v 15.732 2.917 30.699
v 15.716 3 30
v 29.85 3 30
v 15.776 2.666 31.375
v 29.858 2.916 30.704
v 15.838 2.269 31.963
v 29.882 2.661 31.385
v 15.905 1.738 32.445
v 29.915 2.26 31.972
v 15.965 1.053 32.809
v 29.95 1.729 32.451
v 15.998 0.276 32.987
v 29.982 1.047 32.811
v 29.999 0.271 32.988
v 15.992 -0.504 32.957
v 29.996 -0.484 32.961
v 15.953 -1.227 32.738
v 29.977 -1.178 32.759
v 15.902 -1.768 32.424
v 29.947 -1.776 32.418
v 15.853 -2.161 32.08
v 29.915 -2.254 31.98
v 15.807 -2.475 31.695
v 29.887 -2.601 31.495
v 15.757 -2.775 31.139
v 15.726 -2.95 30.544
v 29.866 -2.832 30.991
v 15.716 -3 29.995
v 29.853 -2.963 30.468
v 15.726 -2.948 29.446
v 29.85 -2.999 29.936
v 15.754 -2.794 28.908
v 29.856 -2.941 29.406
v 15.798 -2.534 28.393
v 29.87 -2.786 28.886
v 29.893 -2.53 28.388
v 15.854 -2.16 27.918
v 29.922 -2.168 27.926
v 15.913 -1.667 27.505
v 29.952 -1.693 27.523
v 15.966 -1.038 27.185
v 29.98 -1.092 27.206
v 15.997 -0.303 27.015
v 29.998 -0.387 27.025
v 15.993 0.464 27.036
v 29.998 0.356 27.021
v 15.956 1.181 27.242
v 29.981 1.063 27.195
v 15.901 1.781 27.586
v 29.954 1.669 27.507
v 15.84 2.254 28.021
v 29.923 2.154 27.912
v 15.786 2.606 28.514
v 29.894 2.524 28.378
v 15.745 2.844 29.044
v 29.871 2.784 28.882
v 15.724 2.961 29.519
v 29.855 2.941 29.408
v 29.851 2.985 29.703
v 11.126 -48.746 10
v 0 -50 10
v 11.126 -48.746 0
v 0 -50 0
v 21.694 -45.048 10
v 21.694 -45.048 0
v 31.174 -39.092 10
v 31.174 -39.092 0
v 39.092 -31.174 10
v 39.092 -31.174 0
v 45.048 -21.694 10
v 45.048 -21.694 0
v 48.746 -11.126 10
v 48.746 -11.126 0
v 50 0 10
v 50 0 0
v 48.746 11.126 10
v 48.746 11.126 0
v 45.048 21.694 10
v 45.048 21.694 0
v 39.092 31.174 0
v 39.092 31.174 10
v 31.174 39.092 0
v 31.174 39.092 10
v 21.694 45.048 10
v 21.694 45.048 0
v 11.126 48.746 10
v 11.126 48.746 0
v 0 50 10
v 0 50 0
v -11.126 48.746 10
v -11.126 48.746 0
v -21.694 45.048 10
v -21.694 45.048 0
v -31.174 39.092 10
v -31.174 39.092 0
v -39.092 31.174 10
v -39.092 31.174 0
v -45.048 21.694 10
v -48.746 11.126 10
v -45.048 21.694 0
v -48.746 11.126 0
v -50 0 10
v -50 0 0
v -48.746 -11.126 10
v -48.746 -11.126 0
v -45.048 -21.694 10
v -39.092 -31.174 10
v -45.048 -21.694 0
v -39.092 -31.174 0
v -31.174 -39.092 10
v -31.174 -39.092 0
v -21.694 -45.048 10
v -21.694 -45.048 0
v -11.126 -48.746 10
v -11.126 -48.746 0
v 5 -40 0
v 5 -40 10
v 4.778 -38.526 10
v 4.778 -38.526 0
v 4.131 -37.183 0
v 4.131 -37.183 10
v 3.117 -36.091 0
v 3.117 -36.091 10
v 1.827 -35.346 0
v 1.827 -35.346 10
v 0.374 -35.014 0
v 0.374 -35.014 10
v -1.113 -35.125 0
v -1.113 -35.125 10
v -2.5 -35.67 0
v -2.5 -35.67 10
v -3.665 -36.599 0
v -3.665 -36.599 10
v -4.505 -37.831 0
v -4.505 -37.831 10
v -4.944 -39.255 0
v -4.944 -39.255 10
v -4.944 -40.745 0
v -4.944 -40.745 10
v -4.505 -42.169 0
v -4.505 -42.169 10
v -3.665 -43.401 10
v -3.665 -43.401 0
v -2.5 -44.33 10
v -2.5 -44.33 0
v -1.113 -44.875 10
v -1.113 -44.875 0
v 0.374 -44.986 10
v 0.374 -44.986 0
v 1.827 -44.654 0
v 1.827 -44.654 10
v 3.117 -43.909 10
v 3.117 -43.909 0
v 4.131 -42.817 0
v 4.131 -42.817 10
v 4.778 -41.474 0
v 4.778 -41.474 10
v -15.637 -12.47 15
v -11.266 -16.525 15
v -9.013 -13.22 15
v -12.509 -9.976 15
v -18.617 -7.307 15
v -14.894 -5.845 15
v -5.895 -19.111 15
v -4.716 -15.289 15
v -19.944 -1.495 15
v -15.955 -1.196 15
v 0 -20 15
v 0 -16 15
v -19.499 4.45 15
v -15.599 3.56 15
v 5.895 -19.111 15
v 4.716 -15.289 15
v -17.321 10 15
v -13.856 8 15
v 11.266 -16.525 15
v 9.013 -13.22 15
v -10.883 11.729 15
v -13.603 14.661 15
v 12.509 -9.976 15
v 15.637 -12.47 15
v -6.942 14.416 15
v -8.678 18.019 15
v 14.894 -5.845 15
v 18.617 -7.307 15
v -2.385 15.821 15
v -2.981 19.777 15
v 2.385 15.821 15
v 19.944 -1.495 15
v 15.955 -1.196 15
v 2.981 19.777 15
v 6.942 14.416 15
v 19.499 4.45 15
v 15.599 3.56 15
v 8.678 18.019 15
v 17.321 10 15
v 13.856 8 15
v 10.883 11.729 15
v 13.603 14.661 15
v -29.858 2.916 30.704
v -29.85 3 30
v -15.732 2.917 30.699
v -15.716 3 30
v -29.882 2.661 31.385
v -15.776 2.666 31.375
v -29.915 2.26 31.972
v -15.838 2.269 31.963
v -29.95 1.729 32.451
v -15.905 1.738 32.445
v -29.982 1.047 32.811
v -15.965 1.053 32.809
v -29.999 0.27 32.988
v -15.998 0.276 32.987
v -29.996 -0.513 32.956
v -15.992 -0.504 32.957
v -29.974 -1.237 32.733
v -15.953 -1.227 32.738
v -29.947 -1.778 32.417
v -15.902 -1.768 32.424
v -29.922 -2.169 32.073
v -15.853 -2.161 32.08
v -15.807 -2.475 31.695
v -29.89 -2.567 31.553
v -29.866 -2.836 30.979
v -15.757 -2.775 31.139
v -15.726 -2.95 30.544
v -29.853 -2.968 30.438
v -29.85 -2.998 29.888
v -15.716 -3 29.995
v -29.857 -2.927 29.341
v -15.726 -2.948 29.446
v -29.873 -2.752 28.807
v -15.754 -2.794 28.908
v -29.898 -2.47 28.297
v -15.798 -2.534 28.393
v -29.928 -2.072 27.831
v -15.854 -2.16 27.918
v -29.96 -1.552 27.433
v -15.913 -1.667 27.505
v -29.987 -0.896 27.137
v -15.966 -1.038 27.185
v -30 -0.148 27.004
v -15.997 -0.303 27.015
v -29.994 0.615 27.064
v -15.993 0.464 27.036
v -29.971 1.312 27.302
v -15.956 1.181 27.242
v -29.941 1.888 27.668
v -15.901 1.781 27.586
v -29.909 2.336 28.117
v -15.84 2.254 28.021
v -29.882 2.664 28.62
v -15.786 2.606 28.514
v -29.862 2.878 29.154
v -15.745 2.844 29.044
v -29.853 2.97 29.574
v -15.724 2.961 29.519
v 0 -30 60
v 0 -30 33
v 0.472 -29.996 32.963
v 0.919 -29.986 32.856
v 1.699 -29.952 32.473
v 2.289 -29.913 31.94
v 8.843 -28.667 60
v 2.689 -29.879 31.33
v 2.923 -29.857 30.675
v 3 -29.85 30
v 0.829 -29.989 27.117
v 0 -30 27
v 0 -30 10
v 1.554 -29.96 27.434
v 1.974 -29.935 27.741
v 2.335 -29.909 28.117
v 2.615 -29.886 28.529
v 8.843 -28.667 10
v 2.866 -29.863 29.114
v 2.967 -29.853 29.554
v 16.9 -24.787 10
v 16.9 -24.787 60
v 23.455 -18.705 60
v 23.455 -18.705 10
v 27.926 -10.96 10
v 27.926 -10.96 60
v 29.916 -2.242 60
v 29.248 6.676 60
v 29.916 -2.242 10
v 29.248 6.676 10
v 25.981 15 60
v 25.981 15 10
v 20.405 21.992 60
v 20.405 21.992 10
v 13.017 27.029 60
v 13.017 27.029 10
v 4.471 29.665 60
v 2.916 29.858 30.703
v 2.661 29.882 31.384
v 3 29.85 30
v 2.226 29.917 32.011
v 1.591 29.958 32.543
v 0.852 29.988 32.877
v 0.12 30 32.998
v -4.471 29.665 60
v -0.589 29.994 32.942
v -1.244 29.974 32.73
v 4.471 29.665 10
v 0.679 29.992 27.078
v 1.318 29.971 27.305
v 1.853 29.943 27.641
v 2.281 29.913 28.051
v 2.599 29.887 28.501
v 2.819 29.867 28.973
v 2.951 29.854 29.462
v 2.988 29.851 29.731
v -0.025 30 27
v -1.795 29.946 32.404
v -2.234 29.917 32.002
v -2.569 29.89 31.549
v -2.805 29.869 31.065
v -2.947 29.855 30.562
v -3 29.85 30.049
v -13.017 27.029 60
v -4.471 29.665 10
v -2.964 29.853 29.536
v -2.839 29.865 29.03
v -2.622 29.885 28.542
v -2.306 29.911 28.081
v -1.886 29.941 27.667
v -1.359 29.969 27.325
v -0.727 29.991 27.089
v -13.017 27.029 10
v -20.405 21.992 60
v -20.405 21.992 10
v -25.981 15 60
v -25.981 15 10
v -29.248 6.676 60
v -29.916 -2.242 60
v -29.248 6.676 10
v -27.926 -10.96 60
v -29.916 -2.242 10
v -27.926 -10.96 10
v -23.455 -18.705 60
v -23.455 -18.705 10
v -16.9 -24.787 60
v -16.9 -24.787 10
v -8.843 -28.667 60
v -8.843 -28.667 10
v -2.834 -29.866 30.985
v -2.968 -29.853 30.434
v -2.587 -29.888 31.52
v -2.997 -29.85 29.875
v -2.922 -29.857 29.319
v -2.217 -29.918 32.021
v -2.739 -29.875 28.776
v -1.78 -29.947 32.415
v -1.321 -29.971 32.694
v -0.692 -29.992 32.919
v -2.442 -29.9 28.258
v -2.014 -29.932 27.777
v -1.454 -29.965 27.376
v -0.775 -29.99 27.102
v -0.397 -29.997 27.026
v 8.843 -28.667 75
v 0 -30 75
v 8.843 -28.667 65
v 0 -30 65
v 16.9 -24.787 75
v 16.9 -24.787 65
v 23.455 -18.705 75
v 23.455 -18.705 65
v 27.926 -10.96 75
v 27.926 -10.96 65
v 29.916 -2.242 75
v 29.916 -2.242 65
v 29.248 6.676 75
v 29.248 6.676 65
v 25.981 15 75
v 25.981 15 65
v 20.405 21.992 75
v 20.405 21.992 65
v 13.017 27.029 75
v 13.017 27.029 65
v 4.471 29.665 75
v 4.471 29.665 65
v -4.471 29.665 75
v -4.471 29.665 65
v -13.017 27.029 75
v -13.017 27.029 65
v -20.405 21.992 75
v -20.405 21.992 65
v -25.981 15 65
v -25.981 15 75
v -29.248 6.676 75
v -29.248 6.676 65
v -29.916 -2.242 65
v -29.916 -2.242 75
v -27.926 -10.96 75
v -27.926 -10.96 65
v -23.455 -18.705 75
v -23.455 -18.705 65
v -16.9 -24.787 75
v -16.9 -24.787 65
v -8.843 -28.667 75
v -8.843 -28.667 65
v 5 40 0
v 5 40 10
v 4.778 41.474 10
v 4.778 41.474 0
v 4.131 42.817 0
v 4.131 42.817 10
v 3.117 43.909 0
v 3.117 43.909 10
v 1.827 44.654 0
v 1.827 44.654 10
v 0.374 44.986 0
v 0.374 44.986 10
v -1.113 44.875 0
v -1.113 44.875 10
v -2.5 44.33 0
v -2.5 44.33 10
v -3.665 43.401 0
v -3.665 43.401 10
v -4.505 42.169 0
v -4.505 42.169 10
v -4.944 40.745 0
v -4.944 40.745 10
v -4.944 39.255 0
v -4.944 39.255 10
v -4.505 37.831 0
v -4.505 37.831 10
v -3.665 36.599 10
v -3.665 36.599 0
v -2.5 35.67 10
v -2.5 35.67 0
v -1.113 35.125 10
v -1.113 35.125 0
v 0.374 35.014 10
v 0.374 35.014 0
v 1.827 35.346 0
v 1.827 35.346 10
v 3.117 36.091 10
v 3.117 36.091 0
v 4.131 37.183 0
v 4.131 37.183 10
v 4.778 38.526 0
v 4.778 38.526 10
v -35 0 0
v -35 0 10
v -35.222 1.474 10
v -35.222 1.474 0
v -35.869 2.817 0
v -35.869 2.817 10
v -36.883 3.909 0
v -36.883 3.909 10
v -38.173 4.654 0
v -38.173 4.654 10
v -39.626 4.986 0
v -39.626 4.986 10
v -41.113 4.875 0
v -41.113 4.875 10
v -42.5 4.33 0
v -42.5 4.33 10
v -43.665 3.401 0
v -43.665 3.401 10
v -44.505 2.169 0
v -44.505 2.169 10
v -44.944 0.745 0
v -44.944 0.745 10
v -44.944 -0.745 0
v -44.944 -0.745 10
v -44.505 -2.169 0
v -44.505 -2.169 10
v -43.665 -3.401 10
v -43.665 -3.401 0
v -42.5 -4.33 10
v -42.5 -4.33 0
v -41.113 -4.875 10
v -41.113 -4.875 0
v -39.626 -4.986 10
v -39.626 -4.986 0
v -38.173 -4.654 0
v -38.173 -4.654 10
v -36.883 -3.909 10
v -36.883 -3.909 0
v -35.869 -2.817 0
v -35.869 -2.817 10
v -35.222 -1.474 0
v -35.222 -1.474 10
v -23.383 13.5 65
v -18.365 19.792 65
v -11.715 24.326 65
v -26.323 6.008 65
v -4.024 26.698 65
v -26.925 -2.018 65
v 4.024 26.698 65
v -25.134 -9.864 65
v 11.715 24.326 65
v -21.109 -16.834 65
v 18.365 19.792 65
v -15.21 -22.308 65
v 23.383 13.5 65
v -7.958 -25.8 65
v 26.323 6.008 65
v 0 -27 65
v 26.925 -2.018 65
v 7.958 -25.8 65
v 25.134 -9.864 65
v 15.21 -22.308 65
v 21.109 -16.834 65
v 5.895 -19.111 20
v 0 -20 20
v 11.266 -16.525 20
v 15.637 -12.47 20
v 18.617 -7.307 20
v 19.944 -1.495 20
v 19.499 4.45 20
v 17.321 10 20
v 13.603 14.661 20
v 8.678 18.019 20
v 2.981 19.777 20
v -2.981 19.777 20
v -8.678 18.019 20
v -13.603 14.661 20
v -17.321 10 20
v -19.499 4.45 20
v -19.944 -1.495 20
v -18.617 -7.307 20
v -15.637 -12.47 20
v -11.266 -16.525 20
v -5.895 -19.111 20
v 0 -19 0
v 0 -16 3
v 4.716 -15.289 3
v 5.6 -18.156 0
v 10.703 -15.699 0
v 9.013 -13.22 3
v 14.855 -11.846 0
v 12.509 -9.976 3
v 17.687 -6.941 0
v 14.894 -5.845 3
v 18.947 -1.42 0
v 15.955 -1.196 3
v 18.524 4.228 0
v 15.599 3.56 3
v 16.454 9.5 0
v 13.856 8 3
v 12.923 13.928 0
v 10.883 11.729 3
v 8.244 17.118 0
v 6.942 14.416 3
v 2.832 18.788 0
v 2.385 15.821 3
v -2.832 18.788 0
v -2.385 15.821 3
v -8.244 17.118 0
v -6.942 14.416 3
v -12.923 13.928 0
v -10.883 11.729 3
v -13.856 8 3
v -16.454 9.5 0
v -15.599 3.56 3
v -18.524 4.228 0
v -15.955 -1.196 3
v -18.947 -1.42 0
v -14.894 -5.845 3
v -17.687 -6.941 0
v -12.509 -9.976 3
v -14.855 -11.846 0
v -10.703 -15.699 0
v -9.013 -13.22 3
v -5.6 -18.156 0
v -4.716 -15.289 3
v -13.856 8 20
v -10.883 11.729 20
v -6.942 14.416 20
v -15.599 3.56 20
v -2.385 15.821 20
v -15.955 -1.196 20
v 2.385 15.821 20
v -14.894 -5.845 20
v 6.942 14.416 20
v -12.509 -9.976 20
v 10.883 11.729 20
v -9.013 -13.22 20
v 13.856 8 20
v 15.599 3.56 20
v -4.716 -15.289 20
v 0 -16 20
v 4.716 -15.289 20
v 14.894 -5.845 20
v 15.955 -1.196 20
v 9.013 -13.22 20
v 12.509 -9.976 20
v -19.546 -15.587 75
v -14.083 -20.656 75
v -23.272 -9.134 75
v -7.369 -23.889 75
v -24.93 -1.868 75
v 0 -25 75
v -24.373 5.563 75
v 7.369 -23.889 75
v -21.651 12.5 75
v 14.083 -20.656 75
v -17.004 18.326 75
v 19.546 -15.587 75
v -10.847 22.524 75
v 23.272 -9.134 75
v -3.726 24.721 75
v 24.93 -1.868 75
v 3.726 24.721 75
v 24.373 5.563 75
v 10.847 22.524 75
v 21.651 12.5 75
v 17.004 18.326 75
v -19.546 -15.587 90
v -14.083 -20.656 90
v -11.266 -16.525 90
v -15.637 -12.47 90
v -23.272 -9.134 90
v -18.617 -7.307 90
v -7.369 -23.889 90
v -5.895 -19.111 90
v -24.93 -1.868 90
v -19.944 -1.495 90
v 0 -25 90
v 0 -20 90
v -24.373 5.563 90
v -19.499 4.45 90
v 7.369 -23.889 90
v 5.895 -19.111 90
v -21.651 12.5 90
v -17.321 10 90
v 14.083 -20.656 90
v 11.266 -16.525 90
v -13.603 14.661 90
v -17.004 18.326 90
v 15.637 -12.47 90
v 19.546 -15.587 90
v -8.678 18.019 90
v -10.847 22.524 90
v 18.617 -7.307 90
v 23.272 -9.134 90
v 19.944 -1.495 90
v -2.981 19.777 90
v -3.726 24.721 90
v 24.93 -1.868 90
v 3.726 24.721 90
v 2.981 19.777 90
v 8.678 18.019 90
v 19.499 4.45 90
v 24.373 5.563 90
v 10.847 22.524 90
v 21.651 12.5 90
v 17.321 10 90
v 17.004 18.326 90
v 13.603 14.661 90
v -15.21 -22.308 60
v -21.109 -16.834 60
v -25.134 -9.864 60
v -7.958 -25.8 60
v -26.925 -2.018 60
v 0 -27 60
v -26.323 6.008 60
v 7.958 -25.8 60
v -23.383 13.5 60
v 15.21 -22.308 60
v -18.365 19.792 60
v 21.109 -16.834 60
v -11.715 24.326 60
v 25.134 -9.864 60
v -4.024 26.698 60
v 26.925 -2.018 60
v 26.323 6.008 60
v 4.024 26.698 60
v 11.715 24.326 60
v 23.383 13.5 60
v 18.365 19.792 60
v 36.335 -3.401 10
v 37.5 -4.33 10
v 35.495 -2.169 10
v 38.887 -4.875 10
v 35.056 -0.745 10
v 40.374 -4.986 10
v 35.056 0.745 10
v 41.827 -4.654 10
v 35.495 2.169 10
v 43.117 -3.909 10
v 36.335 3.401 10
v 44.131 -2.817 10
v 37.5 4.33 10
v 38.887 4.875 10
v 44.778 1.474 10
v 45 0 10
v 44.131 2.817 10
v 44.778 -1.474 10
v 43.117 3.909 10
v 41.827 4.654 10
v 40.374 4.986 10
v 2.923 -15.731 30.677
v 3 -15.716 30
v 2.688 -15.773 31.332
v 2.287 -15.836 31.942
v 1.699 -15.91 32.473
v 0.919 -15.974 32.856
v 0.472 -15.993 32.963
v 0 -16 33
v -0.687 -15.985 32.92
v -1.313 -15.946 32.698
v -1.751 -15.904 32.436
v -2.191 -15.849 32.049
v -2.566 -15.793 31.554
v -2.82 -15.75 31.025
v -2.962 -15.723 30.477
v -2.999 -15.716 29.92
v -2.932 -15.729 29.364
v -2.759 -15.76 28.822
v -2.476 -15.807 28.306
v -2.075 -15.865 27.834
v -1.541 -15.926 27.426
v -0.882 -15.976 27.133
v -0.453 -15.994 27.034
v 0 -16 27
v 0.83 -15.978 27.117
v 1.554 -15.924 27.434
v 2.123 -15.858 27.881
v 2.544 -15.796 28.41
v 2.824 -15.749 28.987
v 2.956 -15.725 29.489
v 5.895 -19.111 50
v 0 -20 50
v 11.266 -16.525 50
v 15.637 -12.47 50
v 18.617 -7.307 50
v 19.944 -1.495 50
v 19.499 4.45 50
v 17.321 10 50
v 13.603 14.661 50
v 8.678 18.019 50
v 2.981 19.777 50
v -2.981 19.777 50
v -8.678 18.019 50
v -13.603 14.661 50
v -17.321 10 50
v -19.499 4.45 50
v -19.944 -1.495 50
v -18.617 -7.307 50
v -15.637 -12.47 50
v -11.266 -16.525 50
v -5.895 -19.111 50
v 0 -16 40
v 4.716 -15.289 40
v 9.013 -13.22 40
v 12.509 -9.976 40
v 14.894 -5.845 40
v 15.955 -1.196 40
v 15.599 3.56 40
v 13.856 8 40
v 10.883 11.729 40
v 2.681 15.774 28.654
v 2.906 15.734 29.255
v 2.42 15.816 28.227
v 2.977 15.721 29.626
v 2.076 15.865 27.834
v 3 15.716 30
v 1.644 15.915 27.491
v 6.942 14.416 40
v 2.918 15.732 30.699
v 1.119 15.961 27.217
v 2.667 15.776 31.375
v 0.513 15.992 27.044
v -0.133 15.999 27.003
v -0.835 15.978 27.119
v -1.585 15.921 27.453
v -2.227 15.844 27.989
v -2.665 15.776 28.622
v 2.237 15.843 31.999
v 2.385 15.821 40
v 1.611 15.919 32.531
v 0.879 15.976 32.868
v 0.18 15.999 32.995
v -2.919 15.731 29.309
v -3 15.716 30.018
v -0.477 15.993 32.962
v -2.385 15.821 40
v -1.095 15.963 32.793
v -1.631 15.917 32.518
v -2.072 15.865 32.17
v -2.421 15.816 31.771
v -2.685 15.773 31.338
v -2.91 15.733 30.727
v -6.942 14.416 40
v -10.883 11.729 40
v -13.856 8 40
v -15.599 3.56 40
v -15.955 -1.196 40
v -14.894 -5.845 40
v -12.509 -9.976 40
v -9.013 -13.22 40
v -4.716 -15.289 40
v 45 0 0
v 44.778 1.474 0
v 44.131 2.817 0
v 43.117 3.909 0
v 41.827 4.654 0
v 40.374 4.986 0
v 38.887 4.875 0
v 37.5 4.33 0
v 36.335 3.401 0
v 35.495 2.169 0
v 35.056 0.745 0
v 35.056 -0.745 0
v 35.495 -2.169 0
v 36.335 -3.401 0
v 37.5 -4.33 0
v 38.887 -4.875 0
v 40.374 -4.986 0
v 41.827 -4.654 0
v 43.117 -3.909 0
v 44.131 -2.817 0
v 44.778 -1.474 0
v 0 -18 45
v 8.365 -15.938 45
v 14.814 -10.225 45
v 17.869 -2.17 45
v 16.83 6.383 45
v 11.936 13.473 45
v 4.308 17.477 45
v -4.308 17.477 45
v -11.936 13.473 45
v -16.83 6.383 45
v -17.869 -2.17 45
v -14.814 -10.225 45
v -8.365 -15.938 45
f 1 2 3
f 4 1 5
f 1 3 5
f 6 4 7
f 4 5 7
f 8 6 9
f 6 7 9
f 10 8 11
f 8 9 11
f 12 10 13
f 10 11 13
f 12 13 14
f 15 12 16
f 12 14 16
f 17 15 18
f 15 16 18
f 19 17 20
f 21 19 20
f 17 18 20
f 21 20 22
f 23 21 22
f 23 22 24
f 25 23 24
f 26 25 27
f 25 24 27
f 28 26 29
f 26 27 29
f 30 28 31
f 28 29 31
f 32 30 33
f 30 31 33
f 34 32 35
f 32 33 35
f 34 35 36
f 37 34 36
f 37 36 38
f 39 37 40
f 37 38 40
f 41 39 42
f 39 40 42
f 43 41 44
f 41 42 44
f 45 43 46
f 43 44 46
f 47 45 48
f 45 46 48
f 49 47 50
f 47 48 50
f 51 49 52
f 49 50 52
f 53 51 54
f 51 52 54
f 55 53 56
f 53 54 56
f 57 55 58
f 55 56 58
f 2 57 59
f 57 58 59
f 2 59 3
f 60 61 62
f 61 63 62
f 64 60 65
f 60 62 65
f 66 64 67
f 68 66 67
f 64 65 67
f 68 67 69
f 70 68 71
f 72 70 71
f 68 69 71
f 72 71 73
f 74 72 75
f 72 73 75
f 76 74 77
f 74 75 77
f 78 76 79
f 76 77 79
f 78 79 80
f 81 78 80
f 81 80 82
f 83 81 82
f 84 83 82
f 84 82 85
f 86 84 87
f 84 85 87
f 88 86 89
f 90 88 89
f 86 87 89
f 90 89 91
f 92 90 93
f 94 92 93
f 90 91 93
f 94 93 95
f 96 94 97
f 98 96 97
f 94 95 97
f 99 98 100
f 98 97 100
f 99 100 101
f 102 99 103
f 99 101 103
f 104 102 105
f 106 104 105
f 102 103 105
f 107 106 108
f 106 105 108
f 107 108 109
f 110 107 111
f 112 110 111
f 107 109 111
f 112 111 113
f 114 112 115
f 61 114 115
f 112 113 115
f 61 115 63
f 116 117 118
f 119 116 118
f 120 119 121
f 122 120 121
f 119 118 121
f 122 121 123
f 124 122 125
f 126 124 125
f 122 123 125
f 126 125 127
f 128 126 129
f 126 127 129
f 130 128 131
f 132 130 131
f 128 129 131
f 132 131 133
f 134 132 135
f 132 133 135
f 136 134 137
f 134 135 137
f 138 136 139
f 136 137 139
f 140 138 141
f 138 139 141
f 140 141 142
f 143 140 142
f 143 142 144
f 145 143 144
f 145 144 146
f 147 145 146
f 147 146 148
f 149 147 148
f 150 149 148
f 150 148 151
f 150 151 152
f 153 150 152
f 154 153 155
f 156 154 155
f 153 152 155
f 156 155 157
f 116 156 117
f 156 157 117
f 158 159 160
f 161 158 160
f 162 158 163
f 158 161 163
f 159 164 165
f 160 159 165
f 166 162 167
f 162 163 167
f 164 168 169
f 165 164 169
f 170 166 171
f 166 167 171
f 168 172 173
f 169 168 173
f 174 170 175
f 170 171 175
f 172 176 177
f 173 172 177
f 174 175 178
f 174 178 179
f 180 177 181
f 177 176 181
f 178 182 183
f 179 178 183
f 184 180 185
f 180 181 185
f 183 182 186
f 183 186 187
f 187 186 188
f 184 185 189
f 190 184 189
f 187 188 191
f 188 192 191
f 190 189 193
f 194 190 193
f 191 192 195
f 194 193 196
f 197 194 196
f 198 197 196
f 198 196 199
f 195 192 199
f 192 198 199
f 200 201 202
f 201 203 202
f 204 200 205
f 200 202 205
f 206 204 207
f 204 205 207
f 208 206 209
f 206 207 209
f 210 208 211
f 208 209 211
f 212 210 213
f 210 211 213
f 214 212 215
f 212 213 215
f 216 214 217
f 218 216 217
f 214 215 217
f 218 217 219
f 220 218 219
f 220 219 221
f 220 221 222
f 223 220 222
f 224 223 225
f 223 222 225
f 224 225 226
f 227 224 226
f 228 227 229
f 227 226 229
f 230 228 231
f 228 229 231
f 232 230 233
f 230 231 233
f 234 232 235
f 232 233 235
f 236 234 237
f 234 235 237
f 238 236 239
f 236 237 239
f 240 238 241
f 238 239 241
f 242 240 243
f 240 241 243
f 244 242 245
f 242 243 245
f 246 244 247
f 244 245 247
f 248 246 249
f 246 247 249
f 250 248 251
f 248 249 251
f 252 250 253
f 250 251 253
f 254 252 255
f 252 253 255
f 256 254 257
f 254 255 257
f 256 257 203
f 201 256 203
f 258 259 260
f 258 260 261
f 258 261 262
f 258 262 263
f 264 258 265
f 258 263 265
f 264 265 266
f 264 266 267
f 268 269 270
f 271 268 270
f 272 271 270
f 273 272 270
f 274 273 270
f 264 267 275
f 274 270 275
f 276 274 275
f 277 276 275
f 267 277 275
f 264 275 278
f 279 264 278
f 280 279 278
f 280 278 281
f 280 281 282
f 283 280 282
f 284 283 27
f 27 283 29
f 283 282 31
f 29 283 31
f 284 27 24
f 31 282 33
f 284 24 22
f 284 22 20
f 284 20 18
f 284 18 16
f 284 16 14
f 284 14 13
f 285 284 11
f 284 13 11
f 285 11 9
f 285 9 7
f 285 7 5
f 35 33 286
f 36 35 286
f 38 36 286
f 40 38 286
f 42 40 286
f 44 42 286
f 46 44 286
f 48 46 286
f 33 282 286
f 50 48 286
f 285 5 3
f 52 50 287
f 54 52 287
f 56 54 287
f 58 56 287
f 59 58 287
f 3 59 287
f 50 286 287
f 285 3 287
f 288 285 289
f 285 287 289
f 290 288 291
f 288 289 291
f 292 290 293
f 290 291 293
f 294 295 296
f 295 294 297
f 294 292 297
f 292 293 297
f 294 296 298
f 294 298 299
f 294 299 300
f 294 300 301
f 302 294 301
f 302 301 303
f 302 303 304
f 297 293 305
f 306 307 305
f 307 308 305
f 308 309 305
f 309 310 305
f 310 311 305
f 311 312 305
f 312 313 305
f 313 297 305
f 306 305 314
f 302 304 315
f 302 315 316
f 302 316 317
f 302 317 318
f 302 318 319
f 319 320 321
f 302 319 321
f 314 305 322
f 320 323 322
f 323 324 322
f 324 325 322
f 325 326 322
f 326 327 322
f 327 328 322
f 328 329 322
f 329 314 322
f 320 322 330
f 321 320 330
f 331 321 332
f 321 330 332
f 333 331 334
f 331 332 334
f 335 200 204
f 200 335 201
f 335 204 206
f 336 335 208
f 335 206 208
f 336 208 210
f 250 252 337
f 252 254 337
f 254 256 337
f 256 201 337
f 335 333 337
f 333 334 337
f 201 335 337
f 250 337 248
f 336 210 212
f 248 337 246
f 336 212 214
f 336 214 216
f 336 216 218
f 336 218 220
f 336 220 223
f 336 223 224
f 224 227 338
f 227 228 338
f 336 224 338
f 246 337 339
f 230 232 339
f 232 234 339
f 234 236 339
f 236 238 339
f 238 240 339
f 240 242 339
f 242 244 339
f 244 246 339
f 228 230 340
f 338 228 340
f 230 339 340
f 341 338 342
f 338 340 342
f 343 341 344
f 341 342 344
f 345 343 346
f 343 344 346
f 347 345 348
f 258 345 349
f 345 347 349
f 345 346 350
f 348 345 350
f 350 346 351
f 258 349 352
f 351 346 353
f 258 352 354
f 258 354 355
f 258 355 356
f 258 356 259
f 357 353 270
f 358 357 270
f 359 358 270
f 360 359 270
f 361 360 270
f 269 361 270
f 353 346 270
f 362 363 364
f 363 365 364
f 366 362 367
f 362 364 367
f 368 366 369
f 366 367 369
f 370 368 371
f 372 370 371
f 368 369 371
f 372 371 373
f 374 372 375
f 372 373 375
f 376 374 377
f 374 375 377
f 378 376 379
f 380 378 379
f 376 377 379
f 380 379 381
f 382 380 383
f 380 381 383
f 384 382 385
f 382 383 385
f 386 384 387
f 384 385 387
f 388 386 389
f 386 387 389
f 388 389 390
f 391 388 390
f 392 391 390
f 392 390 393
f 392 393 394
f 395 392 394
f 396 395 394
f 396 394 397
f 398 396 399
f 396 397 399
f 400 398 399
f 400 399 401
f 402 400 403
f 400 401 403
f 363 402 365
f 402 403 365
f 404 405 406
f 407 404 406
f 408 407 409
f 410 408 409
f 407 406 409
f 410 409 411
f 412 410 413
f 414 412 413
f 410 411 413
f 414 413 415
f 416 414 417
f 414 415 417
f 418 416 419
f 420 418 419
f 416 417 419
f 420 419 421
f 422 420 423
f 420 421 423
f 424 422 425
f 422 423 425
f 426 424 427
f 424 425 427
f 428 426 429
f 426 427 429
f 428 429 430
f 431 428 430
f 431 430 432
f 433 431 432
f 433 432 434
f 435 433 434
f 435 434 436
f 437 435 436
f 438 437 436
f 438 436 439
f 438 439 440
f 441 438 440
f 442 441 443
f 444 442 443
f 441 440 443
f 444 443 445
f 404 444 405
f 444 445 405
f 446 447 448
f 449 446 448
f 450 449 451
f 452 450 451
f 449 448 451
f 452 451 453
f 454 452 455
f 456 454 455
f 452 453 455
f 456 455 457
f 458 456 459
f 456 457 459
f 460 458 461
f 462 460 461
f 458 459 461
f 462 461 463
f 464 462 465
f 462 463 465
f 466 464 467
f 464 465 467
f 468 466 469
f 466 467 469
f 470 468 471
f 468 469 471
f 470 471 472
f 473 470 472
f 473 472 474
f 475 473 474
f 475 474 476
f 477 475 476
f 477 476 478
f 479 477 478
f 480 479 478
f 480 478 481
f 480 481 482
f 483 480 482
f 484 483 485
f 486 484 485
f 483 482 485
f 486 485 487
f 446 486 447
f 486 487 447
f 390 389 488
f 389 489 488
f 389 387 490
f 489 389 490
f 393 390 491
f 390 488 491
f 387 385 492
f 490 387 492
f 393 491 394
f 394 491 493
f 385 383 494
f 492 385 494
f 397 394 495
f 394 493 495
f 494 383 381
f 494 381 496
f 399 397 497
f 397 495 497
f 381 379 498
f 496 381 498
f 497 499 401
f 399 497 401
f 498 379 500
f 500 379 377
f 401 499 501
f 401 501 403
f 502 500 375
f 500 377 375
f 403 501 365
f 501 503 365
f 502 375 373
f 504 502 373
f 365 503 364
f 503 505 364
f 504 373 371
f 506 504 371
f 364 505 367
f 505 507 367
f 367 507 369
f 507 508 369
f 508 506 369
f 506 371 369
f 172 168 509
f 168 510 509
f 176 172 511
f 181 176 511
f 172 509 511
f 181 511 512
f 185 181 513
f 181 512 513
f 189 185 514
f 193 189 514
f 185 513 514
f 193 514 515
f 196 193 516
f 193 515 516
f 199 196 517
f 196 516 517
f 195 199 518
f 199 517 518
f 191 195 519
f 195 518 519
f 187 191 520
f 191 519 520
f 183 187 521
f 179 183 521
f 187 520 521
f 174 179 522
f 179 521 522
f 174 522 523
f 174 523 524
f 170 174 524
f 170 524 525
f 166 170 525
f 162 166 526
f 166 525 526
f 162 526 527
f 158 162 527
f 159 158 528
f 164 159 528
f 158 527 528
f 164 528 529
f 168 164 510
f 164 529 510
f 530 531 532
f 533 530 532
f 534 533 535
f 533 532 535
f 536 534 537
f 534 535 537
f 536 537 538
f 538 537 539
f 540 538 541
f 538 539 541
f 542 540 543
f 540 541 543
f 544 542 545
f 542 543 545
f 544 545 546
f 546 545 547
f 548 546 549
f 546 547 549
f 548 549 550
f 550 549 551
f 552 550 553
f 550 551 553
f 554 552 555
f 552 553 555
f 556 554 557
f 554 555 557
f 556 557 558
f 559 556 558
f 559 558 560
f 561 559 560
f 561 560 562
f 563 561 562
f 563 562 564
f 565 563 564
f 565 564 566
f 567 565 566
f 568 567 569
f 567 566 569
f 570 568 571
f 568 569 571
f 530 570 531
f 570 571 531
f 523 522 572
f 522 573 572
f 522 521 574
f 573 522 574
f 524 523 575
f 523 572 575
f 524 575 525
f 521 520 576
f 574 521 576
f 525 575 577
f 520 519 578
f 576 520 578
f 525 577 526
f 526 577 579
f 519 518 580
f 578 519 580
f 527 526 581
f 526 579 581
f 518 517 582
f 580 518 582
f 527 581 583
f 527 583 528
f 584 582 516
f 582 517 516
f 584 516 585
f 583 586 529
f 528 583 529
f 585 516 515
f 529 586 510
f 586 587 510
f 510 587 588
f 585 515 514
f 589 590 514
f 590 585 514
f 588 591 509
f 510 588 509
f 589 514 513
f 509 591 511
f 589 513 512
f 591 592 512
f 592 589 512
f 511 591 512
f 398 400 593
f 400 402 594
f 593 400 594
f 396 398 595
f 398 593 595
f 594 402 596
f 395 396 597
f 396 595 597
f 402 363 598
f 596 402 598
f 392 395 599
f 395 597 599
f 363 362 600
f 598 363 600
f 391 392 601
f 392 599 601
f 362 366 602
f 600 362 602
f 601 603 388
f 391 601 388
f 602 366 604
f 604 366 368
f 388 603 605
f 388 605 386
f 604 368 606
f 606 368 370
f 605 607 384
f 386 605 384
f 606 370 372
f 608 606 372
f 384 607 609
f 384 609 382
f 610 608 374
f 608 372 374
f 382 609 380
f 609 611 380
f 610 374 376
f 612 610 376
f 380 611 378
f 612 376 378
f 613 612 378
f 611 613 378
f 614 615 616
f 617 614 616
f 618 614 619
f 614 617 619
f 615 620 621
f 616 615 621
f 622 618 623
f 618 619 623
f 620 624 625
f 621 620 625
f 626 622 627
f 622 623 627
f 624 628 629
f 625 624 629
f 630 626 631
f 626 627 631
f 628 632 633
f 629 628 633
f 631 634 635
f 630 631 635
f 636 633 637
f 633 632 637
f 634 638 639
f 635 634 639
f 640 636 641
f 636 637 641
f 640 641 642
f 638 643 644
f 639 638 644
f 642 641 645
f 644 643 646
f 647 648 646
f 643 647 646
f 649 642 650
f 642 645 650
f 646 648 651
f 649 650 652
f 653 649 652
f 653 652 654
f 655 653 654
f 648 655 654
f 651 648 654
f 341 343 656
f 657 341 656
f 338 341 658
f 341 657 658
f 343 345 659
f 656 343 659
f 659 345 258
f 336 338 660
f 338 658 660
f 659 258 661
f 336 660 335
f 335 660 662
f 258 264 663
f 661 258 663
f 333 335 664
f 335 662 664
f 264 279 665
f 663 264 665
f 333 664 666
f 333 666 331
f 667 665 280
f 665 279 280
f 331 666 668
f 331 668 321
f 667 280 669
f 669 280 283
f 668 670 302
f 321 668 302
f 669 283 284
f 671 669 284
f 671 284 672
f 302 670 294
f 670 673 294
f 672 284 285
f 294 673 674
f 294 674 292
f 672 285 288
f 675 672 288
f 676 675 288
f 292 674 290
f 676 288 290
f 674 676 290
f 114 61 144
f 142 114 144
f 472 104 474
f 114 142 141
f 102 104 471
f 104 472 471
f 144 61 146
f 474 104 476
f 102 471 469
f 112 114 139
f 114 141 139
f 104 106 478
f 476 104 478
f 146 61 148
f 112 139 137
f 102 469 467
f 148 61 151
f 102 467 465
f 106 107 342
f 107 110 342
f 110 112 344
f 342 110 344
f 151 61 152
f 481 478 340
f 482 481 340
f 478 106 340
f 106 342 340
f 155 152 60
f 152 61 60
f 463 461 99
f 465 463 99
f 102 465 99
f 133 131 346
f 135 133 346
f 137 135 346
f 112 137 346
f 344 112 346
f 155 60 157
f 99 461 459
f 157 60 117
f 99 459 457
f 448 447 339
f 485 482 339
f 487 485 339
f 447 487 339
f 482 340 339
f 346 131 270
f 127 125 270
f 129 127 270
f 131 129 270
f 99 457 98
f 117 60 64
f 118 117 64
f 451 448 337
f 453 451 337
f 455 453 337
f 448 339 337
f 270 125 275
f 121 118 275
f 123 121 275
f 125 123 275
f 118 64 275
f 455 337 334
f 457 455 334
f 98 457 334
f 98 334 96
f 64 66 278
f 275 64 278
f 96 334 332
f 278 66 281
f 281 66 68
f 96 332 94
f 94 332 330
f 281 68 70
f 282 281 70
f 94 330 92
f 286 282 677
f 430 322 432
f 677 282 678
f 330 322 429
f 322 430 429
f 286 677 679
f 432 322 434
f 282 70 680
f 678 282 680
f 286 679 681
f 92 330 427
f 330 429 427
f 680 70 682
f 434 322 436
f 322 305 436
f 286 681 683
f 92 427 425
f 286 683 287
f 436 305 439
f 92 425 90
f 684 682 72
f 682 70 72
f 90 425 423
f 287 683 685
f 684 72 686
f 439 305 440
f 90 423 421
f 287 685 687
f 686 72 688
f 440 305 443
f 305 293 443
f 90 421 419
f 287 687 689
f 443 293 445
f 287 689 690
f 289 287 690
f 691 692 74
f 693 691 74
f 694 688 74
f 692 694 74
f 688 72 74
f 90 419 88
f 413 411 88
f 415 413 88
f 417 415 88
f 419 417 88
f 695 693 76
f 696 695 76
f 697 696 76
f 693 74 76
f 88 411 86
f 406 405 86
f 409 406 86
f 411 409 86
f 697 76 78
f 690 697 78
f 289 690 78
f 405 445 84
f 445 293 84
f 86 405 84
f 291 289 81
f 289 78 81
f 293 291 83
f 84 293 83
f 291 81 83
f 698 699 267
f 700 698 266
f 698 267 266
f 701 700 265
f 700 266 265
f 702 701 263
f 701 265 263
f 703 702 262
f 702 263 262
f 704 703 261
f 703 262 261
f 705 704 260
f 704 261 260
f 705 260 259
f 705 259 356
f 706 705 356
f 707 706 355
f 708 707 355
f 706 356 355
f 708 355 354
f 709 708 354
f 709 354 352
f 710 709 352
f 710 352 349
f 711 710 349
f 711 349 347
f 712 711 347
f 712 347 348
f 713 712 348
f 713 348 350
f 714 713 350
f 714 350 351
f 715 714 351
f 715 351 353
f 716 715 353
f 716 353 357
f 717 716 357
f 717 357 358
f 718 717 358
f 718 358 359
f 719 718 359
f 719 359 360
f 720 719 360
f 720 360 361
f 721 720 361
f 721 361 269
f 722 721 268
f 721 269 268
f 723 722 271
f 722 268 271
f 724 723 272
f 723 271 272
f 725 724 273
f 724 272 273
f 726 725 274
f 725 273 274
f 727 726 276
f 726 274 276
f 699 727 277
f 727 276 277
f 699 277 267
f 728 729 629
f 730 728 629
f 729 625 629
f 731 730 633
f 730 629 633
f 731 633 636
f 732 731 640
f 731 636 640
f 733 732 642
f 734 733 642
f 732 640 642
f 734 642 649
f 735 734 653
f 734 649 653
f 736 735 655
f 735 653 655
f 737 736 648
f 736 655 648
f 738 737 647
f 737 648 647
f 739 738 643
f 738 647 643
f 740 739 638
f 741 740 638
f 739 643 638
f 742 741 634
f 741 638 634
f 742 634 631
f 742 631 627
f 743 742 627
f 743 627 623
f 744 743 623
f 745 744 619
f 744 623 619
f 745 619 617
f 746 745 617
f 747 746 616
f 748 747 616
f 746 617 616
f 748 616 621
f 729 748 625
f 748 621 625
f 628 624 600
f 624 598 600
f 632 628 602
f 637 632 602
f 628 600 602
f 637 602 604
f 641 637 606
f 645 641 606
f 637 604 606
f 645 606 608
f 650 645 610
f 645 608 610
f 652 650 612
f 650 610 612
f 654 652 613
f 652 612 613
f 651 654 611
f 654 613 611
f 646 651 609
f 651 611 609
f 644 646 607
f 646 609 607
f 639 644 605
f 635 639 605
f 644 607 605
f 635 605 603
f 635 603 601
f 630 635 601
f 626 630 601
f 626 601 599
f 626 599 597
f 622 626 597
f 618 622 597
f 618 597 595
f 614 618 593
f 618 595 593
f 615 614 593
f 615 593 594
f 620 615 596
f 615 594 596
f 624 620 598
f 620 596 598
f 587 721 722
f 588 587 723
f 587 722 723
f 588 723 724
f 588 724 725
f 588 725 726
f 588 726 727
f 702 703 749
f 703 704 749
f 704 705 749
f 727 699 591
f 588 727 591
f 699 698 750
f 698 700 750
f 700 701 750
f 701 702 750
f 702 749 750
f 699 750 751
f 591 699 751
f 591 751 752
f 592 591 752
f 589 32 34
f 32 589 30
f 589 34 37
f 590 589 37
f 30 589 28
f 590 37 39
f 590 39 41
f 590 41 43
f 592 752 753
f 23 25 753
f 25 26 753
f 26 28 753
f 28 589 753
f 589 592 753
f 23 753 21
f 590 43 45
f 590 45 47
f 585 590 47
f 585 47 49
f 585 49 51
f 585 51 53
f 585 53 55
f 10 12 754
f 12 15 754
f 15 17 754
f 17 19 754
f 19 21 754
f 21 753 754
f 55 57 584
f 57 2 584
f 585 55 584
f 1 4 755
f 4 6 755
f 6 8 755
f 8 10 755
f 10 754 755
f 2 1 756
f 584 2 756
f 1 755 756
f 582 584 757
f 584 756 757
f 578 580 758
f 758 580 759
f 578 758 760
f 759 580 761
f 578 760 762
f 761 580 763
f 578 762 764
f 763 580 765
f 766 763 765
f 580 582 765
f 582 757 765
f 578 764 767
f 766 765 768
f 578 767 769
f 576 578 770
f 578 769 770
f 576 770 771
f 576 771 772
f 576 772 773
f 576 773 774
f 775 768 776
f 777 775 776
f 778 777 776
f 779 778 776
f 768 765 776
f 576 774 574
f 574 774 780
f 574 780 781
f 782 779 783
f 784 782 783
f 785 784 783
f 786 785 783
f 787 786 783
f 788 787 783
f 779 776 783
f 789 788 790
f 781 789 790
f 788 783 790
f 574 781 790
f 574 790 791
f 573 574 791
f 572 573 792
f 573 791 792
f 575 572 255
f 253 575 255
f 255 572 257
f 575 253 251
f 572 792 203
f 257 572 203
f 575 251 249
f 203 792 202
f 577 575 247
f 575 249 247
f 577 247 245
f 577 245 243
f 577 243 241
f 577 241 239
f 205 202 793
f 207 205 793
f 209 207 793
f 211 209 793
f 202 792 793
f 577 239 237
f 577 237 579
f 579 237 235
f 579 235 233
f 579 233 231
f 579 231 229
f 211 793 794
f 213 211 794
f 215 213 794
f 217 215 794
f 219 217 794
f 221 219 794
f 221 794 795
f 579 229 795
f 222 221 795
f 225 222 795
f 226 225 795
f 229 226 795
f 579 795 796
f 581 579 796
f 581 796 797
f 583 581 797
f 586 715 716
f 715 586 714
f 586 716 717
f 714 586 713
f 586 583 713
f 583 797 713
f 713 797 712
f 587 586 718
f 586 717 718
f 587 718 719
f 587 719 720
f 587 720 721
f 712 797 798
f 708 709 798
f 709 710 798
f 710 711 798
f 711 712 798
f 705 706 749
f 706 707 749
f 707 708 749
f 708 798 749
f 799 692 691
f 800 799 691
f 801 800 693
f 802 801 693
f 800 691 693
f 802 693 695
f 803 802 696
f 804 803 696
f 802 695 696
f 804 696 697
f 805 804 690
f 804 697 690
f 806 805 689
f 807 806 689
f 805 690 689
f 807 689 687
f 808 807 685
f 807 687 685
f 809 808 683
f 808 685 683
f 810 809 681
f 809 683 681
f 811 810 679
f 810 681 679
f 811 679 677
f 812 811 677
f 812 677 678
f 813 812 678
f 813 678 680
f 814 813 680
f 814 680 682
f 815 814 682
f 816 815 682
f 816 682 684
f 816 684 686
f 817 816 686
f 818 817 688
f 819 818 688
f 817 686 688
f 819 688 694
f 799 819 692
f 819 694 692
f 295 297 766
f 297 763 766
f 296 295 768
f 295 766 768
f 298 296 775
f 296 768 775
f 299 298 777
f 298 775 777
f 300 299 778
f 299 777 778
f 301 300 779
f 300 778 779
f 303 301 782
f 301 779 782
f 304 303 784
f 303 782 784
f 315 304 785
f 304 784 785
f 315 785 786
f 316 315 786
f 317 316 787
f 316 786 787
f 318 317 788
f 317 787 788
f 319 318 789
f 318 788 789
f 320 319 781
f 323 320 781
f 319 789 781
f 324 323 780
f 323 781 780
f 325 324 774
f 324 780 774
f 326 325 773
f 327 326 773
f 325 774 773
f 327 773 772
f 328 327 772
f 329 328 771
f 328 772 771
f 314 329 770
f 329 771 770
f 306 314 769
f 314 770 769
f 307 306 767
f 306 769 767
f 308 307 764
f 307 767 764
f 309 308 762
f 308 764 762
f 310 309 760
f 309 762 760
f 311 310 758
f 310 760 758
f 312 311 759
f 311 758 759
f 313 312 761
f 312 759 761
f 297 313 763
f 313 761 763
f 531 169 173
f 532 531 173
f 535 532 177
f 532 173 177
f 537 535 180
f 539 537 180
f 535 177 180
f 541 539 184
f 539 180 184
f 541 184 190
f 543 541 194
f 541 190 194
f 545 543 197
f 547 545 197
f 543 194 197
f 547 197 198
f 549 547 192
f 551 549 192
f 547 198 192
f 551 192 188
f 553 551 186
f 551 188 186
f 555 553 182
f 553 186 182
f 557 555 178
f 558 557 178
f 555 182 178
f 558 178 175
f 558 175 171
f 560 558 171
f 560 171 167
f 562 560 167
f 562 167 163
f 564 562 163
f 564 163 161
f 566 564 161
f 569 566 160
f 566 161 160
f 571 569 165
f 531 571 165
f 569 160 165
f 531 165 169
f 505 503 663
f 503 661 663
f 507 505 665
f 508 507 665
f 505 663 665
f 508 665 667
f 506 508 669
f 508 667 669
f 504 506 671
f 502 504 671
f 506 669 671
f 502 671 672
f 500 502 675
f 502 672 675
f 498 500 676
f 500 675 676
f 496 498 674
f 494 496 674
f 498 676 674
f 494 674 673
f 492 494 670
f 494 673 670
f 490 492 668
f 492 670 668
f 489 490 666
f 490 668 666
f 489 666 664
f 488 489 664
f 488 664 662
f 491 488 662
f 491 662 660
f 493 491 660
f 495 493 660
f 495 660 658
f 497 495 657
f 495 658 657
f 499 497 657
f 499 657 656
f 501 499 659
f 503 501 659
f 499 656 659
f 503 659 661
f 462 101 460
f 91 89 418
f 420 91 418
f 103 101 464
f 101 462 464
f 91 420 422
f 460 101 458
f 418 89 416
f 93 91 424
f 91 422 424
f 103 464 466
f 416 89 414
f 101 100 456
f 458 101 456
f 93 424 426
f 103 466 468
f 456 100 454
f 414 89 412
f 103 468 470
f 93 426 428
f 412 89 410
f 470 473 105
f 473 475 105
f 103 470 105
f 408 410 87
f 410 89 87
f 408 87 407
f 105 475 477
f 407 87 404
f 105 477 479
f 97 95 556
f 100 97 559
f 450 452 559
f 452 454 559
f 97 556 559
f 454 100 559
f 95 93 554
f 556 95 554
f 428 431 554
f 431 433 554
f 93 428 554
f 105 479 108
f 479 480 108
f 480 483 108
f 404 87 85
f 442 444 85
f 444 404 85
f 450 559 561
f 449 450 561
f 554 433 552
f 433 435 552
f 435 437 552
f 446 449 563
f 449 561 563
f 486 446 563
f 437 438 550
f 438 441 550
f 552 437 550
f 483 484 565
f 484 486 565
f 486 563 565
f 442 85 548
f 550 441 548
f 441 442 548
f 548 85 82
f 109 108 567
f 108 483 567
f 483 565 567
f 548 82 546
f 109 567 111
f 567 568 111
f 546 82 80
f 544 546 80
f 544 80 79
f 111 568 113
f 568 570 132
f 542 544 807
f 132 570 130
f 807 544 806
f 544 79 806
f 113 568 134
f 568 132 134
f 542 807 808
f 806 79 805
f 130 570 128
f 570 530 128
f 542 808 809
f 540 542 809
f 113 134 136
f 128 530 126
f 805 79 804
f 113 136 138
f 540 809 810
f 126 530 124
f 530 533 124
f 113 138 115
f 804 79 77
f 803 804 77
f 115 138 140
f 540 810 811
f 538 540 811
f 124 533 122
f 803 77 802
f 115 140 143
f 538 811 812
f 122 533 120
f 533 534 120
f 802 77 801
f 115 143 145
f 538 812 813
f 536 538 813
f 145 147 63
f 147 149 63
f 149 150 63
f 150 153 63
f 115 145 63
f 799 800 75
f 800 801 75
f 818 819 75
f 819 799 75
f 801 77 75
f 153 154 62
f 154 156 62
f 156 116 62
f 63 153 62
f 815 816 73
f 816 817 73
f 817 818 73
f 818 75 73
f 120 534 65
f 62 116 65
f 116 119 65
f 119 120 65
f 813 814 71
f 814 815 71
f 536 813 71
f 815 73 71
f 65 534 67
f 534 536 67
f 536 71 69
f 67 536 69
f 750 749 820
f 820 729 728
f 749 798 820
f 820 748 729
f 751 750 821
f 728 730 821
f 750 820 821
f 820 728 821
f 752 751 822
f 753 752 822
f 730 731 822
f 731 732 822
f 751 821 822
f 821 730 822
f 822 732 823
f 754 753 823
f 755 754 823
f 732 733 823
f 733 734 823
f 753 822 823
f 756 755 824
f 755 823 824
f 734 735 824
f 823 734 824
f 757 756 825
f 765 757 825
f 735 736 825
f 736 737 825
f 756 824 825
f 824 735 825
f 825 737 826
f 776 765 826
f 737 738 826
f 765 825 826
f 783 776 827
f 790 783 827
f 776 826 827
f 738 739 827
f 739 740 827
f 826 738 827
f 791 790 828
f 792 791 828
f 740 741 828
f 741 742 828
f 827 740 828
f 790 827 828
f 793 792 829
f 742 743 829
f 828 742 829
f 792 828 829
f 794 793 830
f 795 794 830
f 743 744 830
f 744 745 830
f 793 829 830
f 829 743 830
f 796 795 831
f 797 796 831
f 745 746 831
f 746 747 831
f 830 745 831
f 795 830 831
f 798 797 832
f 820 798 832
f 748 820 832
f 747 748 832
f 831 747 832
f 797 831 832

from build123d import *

# Parameters (mm, degrees)
F2_SIZE  = 3
F3_R     = 3
F4_DEPTH = 50
F5_R     = 3
F6_DEPTH = 50
F7_R     = 5
F8_DEPTH = 10


with BuildPart() as f1:
    # F0 (on Right) → F1 (revolve)
    with BuildSketch(Plane.YZ):
        Polygon((-50, 0), (-16, 0), (-16, 15), (-20, 15), (-20, 20), (-16, 20), (-16, 40), (-20, 50), (-20, 90), (-25, 90), (-25, 75), (-30, 75), (-30, 65), (-27, 65), (-27, 60), (-30, 60), (-30, 10), (-50, 10), align=None)
    revolve(axis=Axis((0, 0, 45), (0, 0, 1)))

    # F2
    f2_edges = [f1.edges().sort_by_distance(p)[0] for p in [
        (0, 16, 0),
    ]]
    chamfer(f2_edges, length=F2_SIZE)

    # F3 (on Front) → F4 (cut, symmetric)
    with BuildSketch(Plane.XZ):
        with Locations((0, 30)):
            Circle(F3_R)
    extrude(amount=F4_DEPTH, both=True, mode=Mode.SUBTRACT)

    # F5 (on Right) → F6 (cut, symmetric)
    with BuildSketch(Plane.YZ):
        with Locations((0, 30)):
            Circle(F5_R)
    extrude(amount=F6_DEPTH, both=True, mode=Mode.SUBTRACT)

    # F7 (on face) → F8 (cut, through all)
    with BuildSketch(Plane.XY.offset(10)):
        with Locations((0, -40)):
            Circle(F7_R)
        with Locations((40, 0)):
            Circle(F7_R)
        with Locations((0, 40)):
            Circle(F7_R)
        with Locations((-40, 0)):
            Circle(F7_R)
    extrude(amount=-F8_DEPTH, mode=Mode.SUBTRACT)


solid = f1.part
